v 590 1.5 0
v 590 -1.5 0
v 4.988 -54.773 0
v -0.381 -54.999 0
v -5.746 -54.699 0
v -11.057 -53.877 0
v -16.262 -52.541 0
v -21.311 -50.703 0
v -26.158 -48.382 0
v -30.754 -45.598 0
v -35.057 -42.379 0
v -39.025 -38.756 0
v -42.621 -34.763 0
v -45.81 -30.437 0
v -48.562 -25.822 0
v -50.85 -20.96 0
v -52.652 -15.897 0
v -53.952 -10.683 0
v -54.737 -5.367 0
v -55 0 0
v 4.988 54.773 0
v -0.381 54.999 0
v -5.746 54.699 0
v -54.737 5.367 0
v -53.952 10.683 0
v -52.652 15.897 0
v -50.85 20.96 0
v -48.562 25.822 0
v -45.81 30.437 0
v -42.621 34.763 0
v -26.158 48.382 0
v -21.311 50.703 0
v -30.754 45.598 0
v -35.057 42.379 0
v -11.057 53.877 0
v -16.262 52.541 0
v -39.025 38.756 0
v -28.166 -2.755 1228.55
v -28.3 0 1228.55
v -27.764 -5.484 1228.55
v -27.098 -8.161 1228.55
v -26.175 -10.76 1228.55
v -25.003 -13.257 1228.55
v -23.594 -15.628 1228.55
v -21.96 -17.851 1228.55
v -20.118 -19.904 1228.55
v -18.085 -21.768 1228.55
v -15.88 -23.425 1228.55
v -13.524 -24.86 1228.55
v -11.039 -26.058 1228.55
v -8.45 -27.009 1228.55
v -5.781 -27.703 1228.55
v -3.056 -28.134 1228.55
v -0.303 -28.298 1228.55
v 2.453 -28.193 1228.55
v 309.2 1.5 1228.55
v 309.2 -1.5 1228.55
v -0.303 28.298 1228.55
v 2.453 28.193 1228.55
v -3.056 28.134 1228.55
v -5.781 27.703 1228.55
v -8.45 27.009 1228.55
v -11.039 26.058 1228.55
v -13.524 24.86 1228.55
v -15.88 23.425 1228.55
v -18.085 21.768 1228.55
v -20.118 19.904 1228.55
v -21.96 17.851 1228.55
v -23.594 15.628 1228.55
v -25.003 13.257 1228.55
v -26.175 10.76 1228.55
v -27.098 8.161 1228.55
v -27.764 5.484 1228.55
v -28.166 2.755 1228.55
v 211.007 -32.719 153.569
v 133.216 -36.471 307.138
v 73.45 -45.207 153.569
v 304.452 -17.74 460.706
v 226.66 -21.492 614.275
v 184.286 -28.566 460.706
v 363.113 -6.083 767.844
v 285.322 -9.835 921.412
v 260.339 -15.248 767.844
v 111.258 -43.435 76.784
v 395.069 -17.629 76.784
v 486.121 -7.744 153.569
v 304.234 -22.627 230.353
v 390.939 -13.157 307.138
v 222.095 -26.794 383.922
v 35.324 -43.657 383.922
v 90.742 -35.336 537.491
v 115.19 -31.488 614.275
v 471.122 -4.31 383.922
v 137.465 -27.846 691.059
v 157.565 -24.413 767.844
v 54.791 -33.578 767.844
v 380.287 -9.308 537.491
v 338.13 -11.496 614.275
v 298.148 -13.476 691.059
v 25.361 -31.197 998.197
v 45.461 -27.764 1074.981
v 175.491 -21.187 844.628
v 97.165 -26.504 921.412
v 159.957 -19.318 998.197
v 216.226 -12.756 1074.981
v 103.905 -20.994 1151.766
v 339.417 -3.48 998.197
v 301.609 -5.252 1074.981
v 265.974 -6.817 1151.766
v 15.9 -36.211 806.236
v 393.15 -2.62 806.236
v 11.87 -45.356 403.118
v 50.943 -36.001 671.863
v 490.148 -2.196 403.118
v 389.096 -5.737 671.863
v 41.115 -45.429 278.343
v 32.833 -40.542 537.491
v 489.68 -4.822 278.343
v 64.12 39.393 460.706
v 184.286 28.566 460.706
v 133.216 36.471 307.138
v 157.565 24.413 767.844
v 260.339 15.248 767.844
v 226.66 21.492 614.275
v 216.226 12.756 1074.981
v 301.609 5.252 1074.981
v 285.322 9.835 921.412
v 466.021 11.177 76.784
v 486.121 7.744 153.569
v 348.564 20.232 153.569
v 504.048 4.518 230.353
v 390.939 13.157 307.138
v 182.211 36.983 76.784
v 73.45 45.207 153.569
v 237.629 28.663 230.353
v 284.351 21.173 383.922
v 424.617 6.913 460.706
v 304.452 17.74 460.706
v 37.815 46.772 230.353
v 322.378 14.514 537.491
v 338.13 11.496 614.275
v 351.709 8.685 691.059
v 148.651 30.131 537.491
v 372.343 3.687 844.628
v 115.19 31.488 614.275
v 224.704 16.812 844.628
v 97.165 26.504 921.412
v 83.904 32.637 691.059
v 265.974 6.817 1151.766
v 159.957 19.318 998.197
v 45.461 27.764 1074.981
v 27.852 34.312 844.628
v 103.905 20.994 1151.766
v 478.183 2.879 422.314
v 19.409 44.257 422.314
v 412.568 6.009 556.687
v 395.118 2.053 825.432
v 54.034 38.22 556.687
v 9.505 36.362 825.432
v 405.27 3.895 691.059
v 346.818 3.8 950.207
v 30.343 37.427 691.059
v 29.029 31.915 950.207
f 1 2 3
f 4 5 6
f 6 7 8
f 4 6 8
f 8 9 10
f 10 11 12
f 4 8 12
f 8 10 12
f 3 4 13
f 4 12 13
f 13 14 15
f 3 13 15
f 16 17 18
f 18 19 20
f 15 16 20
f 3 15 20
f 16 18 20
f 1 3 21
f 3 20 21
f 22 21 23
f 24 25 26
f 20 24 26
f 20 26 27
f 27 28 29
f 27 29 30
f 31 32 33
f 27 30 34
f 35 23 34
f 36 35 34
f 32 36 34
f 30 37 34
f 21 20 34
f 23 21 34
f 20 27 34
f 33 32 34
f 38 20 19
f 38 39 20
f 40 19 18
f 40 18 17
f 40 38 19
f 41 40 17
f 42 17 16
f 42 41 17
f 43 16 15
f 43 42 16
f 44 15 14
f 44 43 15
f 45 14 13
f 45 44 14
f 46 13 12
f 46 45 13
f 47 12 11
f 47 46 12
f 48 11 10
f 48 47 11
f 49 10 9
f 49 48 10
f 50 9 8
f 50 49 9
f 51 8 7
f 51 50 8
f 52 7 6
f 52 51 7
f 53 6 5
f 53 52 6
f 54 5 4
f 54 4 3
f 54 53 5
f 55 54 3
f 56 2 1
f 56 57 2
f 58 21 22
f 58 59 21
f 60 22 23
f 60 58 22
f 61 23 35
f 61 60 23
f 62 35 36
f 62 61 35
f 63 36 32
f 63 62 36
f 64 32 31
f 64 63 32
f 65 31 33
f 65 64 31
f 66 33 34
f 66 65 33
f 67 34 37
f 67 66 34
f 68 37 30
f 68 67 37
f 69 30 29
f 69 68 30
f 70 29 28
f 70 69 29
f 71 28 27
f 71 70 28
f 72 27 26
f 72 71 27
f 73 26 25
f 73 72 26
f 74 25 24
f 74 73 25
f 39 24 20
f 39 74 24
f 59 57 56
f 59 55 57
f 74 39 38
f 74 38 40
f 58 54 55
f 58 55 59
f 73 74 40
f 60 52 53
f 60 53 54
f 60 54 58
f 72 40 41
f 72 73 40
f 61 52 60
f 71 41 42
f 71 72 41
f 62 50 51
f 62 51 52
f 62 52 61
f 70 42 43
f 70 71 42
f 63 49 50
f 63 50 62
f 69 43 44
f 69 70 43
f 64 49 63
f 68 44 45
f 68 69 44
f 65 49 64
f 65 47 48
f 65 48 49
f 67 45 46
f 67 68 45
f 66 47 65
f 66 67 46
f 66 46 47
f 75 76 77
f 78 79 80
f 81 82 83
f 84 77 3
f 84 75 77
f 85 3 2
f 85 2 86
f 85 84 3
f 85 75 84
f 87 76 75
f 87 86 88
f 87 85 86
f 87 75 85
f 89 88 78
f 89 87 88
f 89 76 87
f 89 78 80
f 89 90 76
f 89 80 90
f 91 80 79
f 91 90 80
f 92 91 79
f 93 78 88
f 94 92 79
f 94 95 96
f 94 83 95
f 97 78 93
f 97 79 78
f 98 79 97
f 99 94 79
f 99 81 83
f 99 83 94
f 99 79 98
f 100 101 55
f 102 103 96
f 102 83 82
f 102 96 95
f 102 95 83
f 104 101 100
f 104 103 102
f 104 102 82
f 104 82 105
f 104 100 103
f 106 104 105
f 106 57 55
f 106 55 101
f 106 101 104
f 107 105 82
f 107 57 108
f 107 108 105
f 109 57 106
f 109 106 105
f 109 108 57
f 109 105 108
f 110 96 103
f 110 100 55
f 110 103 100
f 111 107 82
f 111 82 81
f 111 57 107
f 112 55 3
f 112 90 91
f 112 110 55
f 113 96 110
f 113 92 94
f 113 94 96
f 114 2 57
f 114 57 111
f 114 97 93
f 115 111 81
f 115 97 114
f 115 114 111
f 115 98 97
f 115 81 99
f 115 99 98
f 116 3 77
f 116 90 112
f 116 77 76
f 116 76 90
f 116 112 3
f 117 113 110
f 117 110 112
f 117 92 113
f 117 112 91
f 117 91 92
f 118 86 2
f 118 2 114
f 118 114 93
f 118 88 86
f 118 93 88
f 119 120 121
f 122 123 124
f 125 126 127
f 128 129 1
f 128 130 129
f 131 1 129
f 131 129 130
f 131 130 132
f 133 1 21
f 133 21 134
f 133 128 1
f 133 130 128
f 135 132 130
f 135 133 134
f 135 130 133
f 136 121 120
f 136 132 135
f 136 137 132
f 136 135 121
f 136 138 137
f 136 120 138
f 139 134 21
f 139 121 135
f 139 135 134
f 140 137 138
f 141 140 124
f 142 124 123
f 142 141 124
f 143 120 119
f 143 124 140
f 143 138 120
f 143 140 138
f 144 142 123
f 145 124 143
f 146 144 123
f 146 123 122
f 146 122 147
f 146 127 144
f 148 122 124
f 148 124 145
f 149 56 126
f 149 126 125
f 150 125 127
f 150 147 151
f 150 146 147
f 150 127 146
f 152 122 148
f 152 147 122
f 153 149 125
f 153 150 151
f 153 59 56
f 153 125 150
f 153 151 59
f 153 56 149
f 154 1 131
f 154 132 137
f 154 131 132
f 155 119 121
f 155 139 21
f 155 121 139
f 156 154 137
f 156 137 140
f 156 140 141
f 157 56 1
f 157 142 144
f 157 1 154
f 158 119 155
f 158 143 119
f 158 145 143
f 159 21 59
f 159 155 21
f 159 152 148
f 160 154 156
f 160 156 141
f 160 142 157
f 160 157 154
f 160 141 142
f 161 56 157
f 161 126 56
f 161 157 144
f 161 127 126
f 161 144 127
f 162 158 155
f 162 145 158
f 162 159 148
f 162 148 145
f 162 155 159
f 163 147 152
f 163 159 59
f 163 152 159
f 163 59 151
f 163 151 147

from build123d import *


with BuildPart() as f3:
    # F1 (on Top) → F3 section 0
    with BuildSketch(Plane.XY):
        with BuildLine():
            Line((590, -1.5), (590, 0))
            Line((590, 0), (590, 1.5))
            Line((590, 1.5), (4.9878643333, 54.7733622246))
            ThreePointArc((4.9878643333, 54.7733622246), (-37.0854921881, 40.6160838729), (-55, 0))
            ThreePointArc((-55, 0), (-37.0854921881, -40.6160838729), (4.9878643333, -54.7733622246))
            Line((4.9878643333, -54.7733622246), (590, -1.5))
        make_face()
    # F2 (on offset) → F3 section 1
    with BuildSketch(Plane.XY.offset(1228.55)):
        with BuildLine():
            Line((309.2, -1.5), (309.2, 0))
            Line((309.2, 0), (309.2, 1.5))
            Line((309.2, 1.5), (2.4534276298, 28.1934512408))
            ThreePointArc((2.4534276298, 28.1934512408), (-19.1240424345, 20.8605129602), (-28.3, 0))
            ThreePointArc((-28.3, 0), (-19.1240424345, -20.8605129602), (2.4534276298, -28.1934512408))
            Line((2.4534276298, -28.1934512408), (309.2, -1.5))
        make_face()
    loft()


solid = f3.part
